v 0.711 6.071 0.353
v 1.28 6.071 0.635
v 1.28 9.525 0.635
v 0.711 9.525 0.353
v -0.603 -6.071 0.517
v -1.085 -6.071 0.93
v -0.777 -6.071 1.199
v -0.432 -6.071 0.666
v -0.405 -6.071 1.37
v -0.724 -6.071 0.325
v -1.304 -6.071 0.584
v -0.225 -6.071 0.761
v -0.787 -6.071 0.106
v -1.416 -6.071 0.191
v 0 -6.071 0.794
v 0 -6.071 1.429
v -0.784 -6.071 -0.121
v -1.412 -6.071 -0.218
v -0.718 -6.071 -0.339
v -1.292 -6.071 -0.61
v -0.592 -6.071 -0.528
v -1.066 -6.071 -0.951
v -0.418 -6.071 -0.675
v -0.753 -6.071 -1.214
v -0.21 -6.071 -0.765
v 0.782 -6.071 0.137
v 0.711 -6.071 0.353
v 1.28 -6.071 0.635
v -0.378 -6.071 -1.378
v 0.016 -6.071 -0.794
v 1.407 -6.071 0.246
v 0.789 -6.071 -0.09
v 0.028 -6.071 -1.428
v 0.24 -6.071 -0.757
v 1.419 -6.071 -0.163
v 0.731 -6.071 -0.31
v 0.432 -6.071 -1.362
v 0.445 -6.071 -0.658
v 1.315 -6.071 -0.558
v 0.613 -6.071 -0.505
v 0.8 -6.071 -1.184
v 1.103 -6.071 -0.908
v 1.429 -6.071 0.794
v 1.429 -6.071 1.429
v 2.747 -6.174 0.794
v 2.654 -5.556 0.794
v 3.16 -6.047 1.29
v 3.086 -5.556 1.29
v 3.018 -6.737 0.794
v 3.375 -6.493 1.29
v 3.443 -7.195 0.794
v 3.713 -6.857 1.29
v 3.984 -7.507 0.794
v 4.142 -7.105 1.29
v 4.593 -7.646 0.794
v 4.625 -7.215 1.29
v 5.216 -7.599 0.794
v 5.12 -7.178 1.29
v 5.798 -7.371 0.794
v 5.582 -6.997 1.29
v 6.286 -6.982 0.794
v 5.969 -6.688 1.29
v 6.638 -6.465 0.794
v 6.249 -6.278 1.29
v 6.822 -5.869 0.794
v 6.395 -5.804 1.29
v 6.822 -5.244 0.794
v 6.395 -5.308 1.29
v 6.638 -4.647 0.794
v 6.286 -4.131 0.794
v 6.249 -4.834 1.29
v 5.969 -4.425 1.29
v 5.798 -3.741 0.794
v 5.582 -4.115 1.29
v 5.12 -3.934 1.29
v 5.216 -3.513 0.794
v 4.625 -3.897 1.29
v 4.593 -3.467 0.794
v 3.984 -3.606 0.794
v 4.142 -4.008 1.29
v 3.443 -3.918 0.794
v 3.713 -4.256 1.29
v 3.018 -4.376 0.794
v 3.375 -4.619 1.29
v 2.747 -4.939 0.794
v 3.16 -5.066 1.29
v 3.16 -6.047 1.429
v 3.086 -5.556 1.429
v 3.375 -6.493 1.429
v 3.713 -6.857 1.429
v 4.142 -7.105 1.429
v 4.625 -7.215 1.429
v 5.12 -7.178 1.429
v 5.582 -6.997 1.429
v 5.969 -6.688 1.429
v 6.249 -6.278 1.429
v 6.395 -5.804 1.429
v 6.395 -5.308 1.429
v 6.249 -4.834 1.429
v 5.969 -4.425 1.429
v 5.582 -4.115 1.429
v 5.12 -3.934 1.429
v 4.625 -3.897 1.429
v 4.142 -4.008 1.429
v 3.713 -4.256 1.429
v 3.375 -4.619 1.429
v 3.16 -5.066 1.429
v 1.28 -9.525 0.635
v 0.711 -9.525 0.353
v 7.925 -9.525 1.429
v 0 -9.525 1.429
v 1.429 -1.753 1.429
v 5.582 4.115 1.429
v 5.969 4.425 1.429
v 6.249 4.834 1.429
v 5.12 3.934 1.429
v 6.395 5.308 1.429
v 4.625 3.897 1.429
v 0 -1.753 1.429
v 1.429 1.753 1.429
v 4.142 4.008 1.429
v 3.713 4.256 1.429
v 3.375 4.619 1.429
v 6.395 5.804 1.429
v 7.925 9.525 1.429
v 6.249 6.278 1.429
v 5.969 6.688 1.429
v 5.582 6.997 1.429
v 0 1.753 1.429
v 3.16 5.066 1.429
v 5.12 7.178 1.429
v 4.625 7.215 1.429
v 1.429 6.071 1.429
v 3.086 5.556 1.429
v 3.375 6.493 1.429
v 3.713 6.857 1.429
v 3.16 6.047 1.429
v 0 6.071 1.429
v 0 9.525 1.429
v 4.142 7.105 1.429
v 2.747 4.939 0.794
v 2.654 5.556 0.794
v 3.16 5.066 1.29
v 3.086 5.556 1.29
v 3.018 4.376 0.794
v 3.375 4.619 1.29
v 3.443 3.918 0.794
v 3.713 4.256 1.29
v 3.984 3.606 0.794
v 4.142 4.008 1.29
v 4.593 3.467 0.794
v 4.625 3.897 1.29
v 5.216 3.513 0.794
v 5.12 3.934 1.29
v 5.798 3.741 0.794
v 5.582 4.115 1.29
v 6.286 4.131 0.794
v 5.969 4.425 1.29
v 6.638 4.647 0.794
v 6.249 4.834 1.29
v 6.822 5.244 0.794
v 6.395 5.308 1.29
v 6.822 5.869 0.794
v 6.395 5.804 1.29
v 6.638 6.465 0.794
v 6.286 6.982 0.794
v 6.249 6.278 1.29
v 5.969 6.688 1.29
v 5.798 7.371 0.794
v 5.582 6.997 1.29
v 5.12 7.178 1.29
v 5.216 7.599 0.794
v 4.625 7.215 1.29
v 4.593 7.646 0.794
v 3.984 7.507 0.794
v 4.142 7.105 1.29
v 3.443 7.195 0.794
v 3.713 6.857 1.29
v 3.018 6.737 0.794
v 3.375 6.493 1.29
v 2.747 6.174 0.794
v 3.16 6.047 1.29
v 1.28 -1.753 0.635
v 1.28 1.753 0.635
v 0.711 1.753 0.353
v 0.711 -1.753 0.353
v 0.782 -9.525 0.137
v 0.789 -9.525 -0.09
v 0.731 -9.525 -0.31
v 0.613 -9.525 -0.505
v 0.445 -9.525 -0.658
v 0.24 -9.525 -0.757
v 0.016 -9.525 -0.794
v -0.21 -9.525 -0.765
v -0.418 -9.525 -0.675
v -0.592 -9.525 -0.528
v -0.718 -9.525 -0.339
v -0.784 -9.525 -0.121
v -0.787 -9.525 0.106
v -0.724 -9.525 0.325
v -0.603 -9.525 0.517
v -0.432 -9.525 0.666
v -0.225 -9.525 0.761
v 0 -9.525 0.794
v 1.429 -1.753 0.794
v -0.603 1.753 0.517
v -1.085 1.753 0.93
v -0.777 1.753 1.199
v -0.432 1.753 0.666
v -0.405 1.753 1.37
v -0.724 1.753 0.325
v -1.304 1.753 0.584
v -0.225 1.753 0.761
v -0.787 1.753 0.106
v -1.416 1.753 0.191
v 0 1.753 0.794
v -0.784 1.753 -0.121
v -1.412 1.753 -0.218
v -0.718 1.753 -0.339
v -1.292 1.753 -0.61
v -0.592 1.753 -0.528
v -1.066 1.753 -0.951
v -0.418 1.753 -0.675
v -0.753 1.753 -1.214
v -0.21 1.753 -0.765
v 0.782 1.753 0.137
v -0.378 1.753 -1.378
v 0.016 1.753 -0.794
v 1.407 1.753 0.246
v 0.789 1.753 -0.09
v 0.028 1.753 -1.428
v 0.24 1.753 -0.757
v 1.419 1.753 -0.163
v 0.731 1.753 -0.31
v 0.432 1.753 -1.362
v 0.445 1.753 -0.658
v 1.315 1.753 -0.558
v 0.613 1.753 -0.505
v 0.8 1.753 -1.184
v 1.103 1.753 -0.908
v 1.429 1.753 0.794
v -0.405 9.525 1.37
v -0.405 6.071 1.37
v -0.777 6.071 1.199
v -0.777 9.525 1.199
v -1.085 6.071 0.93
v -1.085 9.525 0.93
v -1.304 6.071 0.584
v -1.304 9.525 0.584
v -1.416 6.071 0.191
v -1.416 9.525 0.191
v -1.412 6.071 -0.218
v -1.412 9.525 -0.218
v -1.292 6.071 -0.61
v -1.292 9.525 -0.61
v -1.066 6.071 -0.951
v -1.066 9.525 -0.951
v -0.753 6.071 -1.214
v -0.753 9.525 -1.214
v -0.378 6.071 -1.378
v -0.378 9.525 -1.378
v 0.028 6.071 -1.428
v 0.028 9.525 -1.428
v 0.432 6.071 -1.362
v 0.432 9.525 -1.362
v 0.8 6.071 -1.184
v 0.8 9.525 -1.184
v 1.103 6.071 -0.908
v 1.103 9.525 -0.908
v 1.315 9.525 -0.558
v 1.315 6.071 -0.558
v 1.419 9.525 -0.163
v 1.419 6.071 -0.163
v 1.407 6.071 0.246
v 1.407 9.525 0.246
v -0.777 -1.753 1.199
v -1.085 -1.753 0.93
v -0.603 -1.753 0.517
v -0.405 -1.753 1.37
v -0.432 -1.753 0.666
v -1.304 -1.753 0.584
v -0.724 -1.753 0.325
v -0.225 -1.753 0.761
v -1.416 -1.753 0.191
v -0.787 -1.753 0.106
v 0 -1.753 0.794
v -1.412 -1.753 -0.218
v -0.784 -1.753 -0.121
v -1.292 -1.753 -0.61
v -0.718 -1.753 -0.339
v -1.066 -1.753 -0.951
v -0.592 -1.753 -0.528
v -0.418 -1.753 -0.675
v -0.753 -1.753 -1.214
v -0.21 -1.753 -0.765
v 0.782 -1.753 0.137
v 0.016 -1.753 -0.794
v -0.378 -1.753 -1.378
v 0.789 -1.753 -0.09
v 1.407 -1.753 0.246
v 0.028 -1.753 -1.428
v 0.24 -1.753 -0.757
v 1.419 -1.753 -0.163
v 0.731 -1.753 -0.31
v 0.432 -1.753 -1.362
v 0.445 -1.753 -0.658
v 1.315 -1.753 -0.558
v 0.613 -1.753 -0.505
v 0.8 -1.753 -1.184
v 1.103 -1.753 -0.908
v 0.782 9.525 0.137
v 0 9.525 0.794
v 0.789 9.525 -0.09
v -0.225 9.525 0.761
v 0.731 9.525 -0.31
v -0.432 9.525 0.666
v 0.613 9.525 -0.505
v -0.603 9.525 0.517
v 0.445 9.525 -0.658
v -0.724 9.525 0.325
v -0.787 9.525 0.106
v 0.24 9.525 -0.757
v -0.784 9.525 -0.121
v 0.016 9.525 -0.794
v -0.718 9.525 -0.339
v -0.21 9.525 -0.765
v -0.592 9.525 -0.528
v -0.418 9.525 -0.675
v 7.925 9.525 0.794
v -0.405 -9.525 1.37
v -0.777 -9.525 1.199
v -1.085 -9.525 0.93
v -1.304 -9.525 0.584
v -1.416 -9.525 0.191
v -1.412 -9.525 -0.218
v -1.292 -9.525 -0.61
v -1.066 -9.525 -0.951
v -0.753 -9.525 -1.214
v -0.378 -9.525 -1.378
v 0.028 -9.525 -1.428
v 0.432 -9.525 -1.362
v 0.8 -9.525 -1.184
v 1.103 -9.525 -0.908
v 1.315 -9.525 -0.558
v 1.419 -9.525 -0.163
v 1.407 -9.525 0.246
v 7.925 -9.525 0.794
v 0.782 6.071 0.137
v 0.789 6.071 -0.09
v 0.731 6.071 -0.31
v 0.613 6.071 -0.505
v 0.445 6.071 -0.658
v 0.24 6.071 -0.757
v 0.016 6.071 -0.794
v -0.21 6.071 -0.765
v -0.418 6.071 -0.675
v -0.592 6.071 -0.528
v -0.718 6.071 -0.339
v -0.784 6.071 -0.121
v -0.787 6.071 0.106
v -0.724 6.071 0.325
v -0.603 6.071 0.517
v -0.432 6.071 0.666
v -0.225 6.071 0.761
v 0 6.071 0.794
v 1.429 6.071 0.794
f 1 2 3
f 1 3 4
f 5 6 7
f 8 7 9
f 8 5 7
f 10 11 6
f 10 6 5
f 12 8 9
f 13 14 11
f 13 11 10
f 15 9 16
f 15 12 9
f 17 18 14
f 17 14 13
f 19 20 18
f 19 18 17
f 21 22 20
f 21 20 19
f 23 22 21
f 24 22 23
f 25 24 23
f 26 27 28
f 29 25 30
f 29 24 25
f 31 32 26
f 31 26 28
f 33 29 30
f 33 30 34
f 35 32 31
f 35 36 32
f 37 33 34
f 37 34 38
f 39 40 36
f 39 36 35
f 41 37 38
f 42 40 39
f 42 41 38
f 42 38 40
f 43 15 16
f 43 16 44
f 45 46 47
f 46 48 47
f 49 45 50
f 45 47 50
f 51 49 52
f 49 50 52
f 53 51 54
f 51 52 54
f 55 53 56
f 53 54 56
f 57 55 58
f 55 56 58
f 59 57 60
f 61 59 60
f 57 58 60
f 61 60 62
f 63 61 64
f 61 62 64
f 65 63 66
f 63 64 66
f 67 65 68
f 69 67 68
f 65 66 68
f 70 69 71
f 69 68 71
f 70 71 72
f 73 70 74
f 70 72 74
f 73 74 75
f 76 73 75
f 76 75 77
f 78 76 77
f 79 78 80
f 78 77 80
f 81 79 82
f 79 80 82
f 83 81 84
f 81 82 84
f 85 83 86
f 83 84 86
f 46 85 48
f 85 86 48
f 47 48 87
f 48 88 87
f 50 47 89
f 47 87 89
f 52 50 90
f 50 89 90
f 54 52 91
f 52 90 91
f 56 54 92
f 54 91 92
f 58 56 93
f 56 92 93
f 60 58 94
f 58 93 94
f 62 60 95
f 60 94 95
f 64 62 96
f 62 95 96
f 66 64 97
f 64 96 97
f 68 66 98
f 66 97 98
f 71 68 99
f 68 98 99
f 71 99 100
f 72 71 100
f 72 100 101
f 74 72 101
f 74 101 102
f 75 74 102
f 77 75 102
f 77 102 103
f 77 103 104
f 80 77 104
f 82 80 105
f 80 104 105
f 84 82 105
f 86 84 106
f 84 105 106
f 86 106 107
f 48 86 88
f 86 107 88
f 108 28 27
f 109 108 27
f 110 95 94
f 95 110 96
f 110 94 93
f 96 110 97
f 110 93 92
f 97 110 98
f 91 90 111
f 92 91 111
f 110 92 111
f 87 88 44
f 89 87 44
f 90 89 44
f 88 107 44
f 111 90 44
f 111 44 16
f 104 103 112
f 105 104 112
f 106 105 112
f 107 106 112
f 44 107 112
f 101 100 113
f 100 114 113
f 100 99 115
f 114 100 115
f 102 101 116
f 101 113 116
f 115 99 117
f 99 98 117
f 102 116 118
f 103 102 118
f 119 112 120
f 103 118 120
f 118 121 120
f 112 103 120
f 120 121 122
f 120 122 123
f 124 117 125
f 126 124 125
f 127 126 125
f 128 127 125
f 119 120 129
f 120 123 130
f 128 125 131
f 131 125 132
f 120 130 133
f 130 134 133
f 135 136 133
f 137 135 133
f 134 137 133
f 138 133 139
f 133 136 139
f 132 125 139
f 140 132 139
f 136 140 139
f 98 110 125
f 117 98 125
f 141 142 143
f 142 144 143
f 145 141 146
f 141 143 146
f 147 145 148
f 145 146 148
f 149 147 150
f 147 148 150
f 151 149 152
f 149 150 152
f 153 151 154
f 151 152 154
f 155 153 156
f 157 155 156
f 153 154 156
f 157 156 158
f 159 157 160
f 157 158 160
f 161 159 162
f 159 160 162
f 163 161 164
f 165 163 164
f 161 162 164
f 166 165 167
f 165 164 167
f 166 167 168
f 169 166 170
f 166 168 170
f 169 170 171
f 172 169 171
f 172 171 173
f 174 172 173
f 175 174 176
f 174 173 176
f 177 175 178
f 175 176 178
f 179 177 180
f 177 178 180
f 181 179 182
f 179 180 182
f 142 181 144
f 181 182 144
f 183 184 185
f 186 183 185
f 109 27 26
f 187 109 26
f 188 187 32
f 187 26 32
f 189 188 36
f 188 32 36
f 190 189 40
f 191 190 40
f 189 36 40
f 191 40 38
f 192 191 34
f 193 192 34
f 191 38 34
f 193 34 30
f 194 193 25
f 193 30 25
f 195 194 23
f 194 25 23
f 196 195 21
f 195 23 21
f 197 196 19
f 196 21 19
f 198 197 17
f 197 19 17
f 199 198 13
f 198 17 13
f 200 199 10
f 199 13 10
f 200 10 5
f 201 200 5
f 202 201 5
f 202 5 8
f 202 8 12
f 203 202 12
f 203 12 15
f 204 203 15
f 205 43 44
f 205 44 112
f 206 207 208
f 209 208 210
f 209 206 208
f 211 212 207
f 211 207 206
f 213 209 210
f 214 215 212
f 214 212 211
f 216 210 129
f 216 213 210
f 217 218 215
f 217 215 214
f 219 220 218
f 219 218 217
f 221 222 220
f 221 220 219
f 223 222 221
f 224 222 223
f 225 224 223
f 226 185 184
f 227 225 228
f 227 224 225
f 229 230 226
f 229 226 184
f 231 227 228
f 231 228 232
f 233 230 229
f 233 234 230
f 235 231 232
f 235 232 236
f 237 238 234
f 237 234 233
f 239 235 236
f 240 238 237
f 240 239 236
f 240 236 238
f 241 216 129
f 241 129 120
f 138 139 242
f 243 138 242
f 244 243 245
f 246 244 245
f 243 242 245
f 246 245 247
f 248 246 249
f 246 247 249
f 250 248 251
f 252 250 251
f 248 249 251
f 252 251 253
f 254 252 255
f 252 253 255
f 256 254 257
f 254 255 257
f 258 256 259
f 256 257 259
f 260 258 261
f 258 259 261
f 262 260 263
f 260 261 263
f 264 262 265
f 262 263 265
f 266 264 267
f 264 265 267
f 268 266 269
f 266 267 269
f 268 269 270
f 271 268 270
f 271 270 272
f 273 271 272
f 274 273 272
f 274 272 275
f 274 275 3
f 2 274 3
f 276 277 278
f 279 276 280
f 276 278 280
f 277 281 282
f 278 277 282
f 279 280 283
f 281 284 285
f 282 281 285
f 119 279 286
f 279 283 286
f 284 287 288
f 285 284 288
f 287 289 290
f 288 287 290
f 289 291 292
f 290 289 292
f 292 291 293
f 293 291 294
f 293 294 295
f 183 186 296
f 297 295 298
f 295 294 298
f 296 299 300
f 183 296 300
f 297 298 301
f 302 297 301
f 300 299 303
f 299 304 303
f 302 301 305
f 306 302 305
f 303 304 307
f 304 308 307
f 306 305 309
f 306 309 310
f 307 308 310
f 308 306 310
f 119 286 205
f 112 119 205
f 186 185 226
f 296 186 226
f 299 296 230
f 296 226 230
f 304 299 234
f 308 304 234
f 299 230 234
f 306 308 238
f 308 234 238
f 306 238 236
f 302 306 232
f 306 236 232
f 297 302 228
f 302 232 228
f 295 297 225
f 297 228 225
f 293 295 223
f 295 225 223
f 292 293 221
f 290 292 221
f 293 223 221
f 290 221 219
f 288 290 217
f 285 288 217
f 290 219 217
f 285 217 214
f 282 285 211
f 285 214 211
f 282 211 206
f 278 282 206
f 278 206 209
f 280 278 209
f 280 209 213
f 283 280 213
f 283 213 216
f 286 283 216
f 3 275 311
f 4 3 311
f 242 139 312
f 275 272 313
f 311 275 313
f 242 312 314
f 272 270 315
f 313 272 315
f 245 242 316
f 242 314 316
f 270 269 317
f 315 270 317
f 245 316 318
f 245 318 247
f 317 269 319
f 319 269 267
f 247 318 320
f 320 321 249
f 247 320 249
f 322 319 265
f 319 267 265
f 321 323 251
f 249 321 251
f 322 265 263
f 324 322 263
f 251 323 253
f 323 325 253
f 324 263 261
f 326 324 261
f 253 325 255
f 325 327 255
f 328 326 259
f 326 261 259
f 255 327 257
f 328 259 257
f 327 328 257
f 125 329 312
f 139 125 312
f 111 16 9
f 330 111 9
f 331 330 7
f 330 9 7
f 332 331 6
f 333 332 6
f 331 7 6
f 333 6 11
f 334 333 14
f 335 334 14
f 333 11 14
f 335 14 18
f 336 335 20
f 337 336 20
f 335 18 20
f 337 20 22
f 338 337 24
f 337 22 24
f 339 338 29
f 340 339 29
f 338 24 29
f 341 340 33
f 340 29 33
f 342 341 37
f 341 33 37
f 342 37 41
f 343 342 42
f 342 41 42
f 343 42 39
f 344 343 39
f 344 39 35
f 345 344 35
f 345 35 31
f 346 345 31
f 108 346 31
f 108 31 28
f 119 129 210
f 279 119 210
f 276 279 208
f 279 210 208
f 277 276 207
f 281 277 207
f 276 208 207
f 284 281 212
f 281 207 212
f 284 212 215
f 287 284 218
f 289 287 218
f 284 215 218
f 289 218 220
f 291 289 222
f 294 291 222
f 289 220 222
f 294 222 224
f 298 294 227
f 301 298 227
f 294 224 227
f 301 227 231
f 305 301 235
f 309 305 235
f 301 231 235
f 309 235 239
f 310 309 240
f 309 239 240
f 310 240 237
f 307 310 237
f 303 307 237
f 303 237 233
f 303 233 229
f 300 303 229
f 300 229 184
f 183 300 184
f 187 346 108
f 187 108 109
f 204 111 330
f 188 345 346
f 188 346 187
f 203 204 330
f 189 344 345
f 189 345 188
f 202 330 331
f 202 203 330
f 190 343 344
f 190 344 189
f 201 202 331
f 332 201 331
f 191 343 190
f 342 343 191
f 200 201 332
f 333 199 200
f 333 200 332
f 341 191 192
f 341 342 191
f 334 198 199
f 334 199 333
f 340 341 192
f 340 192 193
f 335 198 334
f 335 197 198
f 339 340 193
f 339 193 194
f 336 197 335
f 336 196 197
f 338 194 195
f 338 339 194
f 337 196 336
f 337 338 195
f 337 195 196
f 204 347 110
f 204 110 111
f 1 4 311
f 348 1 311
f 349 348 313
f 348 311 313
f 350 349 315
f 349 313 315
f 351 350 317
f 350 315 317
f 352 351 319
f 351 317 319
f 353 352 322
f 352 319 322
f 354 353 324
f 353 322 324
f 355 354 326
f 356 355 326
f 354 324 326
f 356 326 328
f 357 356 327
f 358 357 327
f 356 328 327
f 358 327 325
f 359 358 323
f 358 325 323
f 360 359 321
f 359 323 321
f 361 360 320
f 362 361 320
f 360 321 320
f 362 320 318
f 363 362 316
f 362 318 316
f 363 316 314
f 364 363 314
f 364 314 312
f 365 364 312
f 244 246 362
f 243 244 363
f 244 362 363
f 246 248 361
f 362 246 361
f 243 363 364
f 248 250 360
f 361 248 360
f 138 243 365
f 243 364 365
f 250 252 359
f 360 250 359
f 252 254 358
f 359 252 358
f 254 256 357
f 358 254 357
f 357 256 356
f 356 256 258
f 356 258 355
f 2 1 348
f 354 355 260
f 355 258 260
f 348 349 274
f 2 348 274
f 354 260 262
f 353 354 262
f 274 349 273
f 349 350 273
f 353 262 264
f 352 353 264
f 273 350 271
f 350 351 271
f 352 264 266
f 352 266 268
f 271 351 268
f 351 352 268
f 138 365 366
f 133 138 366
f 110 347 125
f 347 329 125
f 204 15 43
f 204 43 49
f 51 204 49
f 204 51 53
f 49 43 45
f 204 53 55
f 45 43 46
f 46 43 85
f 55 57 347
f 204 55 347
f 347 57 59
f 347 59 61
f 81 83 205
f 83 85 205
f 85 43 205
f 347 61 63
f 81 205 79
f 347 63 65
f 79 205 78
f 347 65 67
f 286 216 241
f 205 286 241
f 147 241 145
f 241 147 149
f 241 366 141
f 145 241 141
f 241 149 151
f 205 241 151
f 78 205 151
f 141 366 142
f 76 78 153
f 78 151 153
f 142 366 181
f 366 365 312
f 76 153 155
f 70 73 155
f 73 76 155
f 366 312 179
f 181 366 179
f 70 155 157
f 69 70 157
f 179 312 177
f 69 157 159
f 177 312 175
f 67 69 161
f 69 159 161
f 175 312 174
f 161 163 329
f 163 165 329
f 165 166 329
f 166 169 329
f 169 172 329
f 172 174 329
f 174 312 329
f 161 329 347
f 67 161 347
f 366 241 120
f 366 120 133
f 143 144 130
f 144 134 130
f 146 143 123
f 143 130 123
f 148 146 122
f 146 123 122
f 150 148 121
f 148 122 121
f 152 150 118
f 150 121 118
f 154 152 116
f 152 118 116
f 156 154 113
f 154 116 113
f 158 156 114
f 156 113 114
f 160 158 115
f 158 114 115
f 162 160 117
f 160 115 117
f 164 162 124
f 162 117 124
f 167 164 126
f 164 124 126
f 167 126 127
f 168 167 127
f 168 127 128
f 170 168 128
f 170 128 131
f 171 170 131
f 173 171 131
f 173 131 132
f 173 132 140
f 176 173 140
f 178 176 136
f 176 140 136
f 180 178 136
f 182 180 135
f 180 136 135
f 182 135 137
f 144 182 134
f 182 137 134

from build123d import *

# Parameters (mm, degrees)
EXTRUDE1_DEPTH          = 9.525
LPATTERN2_COUNT         = 2
LPATTERN2_PITCH         = 11.1125
CUT_EXTRUDE1_DEPTH      = 13.472746554
CUT_EXTRUDE1_DEPTH_BACK = 13.472746554
SKETCH4_W               = 2.8575
SKETCH4_H               = 4.318


with BuildPart() as part:
    # Sketch1 → Extrude1 (new, symmetric)
    with BuildSketch(Plane(origin=(0, 0, 0), x_dir=(1, 0, 0), z_dir=(0, 1, 0))):
        with BuildLine():
            Line((0, -0.79375), (7.9248, -0.79375))
            Line((7.9248, -0.79375), (7.9248, -1.42875))
            Line((7.9248, -1.42875), (0, -1.42875))
            ThreePointArc((0, -1.42875), (-0.753017368, 1.214204022), (1.279883418, -0.635))
            Line((1.279883418, -0.635), (0.711046343, -0.352777778))
            ThreePointArc((0.711046343, -0.352777778), (-0.418342982, 0.67455779), (0, -0.79375))
        make_face()
    extrude(amount=EXTRUDE1_DEPTH, both=True)

    # Sketch7 → Cut-Revolve1 (revolve, cut)
    with BuildSketch(Plane(origin=(4.7498, 0, 0), x_dir=(0, 0, -1), z_dir=(1, 0, 0)), mode=Mode.PRIVATE) as cut_revolve1_sk:
        Polygon((-0.79375, 5.55625), (-0.79375, 7.65175), (-1.290479078, 7.21995), (-1.42875, 7.21995), (-1.42875, 5.55625), align=None)
    cut_revolve1 = revolve(cut_revolve1_sk.sketch.rotate(Axis((4.7498, 5.55625, -1.822321443), (0, 0, 1)), 90), axis=Axis((4.7498, 5.55625, -1.822321443), (0, 0, 1)), mode=Mode.SUBTRACT)

    # LPattern2: Cut-Revolve1 ×2
    with Locations(*[(0, -i * LPATTERN2_PITCH, 0) for i in range(1, LPATTERN2_COUNT)]):
        add(cut_revolve1, mode=Mode.SUBTRACT)

    # Sketch4 → Cut-Extrude1 (cut, two sides: drawn at the far end of the back side and taken through both)
    with BuildSketch(Plane.XY.offset(-CUT_EXTRUDE1_DEPTH_BACK)):
        with Locations((0, 3.9116)):
            Rectangle(SKETCH4_W, SKETCH4_H)
        with Locations((0, -3.9116)):
            Rectangle(SKETCH4_W, SKETCH4_H)
    extrude(amount=CUT_EXTRUDE1_DEPTH + CUT_EXTRUDE1_DEPTH_BACK, mode=Mode.SUBTRACT)


solid = part.part
